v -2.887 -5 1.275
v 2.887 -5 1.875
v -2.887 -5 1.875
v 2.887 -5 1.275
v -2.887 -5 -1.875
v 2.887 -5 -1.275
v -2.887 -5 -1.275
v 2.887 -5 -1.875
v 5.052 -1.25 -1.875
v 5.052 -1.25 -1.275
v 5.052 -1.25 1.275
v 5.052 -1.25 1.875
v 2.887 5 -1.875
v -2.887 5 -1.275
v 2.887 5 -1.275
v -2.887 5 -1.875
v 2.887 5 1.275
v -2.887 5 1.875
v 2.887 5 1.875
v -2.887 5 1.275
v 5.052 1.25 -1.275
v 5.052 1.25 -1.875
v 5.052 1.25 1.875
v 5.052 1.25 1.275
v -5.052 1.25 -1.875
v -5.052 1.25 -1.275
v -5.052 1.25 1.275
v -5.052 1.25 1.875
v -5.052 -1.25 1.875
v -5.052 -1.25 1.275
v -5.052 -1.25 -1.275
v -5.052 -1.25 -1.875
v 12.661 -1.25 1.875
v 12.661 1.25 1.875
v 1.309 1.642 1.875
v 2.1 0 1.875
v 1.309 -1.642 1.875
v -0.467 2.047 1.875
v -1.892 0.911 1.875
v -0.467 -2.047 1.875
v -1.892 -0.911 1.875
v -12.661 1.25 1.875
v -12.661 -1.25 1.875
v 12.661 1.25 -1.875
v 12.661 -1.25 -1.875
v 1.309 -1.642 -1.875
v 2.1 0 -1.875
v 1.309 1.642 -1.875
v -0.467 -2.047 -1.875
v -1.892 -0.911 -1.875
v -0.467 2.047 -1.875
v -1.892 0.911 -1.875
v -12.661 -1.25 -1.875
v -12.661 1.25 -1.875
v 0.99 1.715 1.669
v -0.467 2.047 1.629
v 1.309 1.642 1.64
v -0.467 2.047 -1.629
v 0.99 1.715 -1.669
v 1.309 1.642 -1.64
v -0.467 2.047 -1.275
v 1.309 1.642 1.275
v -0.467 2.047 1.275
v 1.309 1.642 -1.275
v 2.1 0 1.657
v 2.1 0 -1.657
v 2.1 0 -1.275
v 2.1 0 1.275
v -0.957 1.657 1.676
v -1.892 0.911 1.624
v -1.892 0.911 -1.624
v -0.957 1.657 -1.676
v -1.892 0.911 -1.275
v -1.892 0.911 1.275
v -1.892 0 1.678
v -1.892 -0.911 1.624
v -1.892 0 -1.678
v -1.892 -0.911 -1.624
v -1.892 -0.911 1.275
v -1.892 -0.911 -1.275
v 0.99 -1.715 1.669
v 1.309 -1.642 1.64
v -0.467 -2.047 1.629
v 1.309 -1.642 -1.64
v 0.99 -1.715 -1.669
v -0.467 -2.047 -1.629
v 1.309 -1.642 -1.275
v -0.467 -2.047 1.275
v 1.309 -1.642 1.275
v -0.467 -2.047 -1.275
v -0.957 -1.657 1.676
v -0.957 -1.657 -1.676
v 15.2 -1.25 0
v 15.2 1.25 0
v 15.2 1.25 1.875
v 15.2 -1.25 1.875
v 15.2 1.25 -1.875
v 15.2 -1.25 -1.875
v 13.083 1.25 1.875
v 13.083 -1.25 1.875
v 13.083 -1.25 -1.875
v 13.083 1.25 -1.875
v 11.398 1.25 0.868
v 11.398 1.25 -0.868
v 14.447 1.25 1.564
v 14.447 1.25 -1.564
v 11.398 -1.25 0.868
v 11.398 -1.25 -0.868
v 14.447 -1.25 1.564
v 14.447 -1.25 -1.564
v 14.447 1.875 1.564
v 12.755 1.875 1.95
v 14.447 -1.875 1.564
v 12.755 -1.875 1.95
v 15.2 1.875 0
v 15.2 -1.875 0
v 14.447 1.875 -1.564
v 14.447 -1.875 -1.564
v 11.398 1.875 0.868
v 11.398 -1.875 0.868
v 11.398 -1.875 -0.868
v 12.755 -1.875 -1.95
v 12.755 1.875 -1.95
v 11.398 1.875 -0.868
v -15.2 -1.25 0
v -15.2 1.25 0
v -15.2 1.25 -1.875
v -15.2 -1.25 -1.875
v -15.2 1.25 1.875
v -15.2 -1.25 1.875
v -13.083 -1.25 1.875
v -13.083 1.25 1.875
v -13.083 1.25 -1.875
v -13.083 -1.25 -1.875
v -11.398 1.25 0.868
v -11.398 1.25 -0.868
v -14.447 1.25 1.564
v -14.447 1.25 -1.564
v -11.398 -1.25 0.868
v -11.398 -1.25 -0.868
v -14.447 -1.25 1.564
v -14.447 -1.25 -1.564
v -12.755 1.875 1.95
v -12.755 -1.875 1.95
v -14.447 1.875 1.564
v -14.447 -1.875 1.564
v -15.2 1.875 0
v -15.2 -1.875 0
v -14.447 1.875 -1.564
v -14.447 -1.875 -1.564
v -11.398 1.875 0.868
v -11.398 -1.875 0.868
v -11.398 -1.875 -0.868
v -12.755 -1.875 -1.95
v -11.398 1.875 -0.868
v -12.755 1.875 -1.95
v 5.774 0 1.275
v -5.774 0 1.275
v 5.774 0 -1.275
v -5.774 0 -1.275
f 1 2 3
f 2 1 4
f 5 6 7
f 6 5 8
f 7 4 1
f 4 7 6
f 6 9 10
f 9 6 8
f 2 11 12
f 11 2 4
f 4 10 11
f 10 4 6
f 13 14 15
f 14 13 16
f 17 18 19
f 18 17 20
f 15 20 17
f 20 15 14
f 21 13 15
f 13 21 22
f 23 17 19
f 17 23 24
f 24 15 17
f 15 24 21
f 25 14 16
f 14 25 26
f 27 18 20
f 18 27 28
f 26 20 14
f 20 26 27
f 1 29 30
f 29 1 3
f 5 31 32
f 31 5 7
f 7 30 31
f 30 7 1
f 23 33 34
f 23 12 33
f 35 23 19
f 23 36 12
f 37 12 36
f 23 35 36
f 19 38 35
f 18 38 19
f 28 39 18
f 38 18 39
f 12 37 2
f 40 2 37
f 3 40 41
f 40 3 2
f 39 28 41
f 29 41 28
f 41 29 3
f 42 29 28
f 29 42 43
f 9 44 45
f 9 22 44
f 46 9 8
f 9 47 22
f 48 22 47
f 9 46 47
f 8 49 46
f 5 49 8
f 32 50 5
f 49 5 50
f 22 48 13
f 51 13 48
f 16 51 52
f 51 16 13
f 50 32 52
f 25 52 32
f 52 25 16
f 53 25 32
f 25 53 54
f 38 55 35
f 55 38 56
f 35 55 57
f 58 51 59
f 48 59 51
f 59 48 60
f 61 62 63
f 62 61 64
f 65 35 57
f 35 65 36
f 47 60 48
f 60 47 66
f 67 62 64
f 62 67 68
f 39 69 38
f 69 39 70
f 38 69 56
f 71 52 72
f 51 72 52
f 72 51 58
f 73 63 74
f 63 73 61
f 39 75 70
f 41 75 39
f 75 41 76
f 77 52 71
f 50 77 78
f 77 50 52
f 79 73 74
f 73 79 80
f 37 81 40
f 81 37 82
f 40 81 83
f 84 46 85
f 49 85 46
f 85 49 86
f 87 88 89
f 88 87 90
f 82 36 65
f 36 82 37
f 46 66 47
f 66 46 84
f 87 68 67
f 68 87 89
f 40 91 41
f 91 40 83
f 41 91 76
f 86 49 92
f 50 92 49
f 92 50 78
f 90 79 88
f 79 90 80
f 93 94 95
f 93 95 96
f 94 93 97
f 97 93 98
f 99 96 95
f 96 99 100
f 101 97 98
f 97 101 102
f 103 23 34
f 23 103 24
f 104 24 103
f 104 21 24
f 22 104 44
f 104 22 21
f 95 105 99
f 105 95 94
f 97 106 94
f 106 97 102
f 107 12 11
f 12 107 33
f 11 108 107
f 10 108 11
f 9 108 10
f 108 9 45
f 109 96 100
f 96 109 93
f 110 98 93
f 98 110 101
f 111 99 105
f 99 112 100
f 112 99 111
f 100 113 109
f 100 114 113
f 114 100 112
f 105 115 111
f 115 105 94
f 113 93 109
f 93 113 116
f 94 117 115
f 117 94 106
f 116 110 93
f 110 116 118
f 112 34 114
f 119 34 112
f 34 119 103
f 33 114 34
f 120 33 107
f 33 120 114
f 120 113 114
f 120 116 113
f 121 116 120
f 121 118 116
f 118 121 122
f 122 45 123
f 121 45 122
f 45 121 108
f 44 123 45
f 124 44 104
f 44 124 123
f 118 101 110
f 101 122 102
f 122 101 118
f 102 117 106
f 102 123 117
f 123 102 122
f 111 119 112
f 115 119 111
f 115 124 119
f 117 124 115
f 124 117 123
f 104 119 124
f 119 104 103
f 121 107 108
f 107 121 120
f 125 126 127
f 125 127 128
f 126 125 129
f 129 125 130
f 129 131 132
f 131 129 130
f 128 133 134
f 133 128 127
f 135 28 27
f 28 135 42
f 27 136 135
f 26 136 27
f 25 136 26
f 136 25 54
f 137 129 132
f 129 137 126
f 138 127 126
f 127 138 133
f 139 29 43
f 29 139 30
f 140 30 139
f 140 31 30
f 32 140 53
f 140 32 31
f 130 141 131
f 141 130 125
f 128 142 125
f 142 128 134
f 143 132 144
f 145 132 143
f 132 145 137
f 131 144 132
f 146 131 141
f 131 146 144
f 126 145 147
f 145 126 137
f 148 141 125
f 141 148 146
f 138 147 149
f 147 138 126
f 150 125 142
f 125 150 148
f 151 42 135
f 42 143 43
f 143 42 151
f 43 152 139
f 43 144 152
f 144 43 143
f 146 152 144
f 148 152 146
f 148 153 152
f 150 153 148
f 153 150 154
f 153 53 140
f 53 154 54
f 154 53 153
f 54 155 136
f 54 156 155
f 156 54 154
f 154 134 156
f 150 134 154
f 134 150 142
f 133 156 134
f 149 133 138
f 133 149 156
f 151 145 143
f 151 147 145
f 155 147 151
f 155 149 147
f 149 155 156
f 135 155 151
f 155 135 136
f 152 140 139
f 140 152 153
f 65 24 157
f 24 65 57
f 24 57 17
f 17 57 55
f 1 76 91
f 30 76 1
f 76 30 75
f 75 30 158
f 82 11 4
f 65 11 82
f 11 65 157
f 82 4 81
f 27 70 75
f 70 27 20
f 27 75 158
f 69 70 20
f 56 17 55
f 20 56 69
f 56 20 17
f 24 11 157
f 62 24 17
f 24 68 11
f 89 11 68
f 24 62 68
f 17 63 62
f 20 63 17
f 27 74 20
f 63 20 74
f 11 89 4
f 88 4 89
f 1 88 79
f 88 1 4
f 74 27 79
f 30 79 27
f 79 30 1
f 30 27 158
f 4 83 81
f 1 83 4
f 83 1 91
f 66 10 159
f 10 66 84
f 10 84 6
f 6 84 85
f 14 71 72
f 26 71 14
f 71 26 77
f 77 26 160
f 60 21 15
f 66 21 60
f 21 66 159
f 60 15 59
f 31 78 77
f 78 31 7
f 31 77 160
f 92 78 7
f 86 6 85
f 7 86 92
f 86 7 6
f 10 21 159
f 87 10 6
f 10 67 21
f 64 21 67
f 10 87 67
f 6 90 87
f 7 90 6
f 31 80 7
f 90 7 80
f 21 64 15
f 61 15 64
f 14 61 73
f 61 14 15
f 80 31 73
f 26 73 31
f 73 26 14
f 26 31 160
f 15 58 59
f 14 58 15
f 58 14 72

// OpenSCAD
// Parameters
thread_diameter = 4.0; //[2.0:8.0:0.1]
thread_pitch = 0.7; //[0.35:1.4:0.05]
across_flats = 10.0; //[5.0:20.0:0.1]
thickness = 3.75; //[2.0:7.5:0.05]
thread_clearance = 0.2; //[0.0:0.6:0.05]
wing_count = 2; //[2:2:1]
wing_span_total = 24.0; //[12.0:48.0:0.5]
wing_length_from_hex = 7.0; //[3.5:14.0:0.25]
wing_height = 3.75; //[2.0:7.5:0.05]
wing_thickness = 2.5; //[1.2:5.0:0.1]
wing_tip_radius = 2.0; //[0.8:4.0:0.1]
wing_root_fillet_radius = 1.0; //[0.4:2.0:0.1]
hex_corner_chamfer = 0.3; //[0.0:1.0:0.05]
overlap = 0.8; //[0.2:2.0:0.1]
hole_extra_height = 2.0; //[0.5:6.0:0.5]

// Hex Nut Core
module hex_nut_core() {
  color("DimGray") {
    difference() {
      cylinder(h=thickness, r=across_flats/(2*cos(30)), center=true, $fn=6);
      translate([0, 0, -hole_extra_height/2])
        cylinder(h=thickness + hole_extra_height, r=(thread_diameter + thread_clearance)/2, center=true);
    }
  }
}

// Wing
module wing() {
  color("Silver") {
    union() {
      // Wing body
      translate([across_flats/2 + (wing_length_from_hex + wing_tip_radius*2)/2 - overlap, 0, 0])
        cube([wing_length_from_hex + wing_tip_radius*2, wing_thickness, wing_height], center=true);
      // Wing tip
      translate([across_flats/2 + wing_length_from_hex + wing_tip_radius - overlap, 0, 0])
        rotate([90, 0, 0])
        cylinder(h=wing_height, r=wing_tip_radius, center=true);
    }
  }
}

// Wing Root Fillet
module wing_root_fillet() {
  color("Silver") {
    hull() {
      translate([across_flats/2 - overlap, 0, 0])
        sphere(r=wing_root_fillet_radius, center=true);
      translate([across_flats/2 + wing_root_fillet_radius - overlap, 0, 0])
        sphere(r=wing_root_fillet_radius, center=true);
    }
  }
}

// Nut and Washer
module nut_and_washer() {
  union() {
    hex_nut_core();
    // Right wing
    translate([0, 0, 0]) {
      wing();
      wing_root_fillet();
    }
    // Left wing
    mirror([1, 0, 0]) {
      wing();
      wing_root_fillet();
    }
  }
}

// Edge Chamfers
module edge_chamfers() {
  difference() {
    nut_and_washer();
    // Top chamfer
    translate([0, 0, thickness/2 - hex_corner_chamfer])
      cylinder(h=hex_corner_chamfer*2, r1=across_flats/(2*cos(30)), r2=0, center=true, $fn=6);
    // Bottom chamfer
    translate([0, 0, -(thickness/2 - hex_corner_chamfer)])
      rotate([180, 0, 0])
      cylinder(h=hex_corner_chamfer*2, r1=across_flats/(2*cos(30)), r2=0, center=true, $fn=6);
  }
}

// Final Assembly
module assembly() {
  edge_chamfers();
}

assembly();
